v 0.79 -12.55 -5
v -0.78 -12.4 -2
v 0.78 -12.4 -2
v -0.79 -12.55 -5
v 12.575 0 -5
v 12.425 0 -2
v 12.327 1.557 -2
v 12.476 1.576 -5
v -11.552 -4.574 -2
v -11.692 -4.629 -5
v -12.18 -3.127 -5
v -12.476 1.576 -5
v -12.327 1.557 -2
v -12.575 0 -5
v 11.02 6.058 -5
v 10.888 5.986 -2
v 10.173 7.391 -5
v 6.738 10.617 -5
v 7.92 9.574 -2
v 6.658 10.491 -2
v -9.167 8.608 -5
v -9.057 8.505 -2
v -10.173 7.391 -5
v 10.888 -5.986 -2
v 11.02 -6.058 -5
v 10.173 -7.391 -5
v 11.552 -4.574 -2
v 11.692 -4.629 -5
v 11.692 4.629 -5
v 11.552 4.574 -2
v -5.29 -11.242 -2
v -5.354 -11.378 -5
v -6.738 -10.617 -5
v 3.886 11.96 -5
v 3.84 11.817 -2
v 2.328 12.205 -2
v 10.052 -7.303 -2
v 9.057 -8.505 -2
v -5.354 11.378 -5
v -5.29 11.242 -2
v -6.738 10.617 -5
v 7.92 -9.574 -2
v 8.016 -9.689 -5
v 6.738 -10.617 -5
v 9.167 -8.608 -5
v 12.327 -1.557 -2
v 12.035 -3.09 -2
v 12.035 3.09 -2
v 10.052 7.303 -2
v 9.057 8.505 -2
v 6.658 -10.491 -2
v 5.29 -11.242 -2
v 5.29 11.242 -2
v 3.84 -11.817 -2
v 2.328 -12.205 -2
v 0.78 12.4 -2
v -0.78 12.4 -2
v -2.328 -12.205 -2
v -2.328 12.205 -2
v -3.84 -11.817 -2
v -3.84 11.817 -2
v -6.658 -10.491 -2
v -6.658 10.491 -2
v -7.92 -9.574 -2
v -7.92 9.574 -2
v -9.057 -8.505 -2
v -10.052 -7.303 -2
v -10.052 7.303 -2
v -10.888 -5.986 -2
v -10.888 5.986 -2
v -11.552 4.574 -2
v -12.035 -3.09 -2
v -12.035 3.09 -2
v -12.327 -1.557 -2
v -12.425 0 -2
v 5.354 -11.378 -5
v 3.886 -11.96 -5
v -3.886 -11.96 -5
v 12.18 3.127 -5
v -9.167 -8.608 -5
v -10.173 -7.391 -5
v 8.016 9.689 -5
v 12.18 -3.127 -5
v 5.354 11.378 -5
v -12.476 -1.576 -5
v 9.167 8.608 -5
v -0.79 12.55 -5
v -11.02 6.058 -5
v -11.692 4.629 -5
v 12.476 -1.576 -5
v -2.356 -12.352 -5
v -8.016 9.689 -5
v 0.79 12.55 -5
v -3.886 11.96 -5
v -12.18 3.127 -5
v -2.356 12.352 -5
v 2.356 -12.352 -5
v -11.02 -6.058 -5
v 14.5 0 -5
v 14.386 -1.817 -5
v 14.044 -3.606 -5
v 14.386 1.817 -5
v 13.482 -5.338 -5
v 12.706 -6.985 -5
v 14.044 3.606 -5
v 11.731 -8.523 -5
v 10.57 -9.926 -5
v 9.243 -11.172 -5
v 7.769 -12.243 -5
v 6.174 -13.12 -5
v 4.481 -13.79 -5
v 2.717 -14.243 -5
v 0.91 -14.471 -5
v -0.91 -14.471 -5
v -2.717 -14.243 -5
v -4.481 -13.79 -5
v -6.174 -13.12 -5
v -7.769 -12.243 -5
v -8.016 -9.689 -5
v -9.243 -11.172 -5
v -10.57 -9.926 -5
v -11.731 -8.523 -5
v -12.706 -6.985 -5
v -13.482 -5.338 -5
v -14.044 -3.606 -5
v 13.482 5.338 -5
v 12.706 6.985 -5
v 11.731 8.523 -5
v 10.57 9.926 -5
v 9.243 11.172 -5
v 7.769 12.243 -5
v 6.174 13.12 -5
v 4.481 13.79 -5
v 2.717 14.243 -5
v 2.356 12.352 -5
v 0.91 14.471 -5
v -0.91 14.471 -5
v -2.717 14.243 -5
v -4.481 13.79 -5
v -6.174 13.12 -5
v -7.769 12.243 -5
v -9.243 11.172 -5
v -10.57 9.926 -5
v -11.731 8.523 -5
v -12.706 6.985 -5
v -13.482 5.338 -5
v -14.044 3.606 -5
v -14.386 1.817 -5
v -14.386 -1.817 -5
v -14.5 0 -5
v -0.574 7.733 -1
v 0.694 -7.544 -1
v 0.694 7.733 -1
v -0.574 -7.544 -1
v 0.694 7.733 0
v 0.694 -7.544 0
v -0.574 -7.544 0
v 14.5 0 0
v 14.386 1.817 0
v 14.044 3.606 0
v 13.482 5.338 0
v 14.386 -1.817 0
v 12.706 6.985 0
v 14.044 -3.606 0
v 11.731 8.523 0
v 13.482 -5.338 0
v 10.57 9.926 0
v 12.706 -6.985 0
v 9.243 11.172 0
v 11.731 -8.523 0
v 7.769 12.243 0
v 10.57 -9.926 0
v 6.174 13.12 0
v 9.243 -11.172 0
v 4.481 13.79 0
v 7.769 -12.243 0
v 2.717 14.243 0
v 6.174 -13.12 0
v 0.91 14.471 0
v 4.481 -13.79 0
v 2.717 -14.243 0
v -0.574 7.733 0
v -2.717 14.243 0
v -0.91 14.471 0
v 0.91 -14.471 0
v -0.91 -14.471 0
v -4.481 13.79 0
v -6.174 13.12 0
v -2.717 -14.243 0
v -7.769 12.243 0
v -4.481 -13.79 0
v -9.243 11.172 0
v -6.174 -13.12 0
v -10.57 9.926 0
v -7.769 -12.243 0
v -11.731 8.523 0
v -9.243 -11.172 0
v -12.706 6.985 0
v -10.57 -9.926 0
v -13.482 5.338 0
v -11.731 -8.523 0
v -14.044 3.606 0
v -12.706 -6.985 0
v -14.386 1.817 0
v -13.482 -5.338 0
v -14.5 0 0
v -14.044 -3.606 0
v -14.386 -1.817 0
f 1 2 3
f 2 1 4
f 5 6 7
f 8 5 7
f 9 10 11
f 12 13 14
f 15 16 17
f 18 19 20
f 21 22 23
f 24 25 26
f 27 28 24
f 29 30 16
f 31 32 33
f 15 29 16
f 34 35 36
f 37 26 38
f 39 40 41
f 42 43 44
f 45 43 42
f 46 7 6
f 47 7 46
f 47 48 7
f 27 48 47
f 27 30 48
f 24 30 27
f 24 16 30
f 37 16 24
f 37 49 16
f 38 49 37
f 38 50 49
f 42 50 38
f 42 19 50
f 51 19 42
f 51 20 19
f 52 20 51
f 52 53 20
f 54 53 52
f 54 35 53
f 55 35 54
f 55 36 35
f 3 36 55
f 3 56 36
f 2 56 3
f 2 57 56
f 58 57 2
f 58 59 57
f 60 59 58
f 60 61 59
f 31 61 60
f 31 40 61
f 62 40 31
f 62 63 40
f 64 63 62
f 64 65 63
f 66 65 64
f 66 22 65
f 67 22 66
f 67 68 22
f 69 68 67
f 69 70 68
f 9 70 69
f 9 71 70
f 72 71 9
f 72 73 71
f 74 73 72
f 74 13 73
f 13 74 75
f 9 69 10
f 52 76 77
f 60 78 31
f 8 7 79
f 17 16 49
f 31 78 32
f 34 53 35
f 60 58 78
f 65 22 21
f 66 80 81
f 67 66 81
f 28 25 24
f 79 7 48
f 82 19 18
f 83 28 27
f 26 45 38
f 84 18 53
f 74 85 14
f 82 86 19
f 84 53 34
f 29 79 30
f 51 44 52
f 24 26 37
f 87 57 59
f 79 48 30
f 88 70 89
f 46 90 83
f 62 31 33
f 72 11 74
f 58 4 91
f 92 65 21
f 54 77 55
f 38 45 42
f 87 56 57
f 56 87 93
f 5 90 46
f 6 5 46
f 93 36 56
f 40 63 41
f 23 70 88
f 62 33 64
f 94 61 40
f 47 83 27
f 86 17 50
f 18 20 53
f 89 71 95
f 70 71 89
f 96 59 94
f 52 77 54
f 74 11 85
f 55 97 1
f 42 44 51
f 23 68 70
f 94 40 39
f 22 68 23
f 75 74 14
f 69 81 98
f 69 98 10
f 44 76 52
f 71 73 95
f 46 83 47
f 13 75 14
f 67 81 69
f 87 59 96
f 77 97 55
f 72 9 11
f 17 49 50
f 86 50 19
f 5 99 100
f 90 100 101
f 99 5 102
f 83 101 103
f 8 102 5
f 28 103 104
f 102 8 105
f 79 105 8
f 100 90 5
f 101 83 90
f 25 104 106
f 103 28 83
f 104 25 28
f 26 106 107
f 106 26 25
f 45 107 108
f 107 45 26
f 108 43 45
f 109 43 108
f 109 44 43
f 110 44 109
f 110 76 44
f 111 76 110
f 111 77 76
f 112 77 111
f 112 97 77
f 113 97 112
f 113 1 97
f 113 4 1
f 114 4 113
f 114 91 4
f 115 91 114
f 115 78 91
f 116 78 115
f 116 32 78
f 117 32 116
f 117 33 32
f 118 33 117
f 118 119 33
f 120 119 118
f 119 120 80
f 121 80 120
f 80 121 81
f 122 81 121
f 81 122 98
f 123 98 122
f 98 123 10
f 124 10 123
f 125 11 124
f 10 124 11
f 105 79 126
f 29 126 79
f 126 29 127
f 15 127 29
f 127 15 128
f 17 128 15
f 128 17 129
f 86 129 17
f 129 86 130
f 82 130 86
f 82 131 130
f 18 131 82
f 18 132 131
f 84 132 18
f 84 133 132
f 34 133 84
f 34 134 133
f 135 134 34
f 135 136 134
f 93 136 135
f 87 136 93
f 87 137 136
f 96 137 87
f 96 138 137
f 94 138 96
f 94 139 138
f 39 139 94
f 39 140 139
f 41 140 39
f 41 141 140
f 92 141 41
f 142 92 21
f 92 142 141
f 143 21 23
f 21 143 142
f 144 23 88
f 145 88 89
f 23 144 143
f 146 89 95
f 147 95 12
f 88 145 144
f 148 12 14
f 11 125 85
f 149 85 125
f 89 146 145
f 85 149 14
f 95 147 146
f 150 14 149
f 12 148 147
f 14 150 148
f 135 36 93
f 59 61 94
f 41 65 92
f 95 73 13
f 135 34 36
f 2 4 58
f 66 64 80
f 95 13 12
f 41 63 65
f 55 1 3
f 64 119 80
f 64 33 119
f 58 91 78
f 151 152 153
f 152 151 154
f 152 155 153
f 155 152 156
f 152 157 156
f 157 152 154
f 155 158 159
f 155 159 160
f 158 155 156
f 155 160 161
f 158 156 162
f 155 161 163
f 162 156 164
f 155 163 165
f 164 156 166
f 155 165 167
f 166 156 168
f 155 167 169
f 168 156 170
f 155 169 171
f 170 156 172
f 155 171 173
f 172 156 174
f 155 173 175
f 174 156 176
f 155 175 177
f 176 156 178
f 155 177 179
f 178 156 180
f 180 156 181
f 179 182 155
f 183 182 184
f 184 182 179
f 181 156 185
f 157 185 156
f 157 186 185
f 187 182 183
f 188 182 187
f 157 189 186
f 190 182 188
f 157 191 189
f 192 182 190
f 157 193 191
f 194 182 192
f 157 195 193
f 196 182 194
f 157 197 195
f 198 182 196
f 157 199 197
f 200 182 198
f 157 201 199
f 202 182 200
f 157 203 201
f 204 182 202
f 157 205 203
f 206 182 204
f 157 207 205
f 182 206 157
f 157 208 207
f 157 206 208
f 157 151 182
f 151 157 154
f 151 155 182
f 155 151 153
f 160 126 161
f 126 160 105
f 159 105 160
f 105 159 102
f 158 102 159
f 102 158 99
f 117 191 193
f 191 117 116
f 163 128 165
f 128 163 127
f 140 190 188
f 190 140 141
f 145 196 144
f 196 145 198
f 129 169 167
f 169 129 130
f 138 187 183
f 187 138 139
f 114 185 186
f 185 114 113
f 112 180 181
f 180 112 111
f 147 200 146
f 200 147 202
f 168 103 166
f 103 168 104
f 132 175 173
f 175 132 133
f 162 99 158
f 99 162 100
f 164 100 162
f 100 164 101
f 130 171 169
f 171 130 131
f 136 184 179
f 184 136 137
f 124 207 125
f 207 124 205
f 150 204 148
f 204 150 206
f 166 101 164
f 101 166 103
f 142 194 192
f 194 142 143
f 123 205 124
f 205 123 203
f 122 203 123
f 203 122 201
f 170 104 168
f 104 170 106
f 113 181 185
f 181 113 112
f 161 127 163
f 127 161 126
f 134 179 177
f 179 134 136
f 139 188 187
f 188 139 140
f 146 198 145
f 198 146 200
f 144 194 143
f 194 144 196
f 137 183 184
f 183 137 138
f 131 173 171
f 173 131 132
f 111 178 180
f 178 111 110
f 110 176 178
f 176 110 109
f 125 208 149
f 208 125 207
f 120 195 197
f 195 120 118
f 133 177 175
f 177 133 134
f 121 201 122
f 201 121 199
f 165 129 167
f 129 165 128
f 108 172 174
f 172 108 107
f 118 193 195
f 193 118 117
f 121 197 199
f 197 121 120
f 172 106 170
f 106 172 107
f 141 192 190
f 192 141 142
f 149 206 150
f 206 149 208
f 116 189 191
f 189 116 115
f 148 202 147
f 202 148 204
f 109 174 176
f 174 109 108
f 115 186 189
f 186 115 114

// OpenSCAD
$fn = 50;

difference() {
	union() {
		translate(v = [0, 0, -5.0]) {
			cylinder(h = 5, r = 14.5);
		}
	}
	union() {
		#translate(v = [0, 0, -5.0]) {
			cylinder(h = 3, r1 = 12.575, r2 = 12.425);
		}
		translate(v = [0, 0, -1]) {
			linear_extrude(height = 1) {
				text(font = "Wingdings", halign = "center", size = 11, text = "|", valign = "center");
			}
		}
	}
}
